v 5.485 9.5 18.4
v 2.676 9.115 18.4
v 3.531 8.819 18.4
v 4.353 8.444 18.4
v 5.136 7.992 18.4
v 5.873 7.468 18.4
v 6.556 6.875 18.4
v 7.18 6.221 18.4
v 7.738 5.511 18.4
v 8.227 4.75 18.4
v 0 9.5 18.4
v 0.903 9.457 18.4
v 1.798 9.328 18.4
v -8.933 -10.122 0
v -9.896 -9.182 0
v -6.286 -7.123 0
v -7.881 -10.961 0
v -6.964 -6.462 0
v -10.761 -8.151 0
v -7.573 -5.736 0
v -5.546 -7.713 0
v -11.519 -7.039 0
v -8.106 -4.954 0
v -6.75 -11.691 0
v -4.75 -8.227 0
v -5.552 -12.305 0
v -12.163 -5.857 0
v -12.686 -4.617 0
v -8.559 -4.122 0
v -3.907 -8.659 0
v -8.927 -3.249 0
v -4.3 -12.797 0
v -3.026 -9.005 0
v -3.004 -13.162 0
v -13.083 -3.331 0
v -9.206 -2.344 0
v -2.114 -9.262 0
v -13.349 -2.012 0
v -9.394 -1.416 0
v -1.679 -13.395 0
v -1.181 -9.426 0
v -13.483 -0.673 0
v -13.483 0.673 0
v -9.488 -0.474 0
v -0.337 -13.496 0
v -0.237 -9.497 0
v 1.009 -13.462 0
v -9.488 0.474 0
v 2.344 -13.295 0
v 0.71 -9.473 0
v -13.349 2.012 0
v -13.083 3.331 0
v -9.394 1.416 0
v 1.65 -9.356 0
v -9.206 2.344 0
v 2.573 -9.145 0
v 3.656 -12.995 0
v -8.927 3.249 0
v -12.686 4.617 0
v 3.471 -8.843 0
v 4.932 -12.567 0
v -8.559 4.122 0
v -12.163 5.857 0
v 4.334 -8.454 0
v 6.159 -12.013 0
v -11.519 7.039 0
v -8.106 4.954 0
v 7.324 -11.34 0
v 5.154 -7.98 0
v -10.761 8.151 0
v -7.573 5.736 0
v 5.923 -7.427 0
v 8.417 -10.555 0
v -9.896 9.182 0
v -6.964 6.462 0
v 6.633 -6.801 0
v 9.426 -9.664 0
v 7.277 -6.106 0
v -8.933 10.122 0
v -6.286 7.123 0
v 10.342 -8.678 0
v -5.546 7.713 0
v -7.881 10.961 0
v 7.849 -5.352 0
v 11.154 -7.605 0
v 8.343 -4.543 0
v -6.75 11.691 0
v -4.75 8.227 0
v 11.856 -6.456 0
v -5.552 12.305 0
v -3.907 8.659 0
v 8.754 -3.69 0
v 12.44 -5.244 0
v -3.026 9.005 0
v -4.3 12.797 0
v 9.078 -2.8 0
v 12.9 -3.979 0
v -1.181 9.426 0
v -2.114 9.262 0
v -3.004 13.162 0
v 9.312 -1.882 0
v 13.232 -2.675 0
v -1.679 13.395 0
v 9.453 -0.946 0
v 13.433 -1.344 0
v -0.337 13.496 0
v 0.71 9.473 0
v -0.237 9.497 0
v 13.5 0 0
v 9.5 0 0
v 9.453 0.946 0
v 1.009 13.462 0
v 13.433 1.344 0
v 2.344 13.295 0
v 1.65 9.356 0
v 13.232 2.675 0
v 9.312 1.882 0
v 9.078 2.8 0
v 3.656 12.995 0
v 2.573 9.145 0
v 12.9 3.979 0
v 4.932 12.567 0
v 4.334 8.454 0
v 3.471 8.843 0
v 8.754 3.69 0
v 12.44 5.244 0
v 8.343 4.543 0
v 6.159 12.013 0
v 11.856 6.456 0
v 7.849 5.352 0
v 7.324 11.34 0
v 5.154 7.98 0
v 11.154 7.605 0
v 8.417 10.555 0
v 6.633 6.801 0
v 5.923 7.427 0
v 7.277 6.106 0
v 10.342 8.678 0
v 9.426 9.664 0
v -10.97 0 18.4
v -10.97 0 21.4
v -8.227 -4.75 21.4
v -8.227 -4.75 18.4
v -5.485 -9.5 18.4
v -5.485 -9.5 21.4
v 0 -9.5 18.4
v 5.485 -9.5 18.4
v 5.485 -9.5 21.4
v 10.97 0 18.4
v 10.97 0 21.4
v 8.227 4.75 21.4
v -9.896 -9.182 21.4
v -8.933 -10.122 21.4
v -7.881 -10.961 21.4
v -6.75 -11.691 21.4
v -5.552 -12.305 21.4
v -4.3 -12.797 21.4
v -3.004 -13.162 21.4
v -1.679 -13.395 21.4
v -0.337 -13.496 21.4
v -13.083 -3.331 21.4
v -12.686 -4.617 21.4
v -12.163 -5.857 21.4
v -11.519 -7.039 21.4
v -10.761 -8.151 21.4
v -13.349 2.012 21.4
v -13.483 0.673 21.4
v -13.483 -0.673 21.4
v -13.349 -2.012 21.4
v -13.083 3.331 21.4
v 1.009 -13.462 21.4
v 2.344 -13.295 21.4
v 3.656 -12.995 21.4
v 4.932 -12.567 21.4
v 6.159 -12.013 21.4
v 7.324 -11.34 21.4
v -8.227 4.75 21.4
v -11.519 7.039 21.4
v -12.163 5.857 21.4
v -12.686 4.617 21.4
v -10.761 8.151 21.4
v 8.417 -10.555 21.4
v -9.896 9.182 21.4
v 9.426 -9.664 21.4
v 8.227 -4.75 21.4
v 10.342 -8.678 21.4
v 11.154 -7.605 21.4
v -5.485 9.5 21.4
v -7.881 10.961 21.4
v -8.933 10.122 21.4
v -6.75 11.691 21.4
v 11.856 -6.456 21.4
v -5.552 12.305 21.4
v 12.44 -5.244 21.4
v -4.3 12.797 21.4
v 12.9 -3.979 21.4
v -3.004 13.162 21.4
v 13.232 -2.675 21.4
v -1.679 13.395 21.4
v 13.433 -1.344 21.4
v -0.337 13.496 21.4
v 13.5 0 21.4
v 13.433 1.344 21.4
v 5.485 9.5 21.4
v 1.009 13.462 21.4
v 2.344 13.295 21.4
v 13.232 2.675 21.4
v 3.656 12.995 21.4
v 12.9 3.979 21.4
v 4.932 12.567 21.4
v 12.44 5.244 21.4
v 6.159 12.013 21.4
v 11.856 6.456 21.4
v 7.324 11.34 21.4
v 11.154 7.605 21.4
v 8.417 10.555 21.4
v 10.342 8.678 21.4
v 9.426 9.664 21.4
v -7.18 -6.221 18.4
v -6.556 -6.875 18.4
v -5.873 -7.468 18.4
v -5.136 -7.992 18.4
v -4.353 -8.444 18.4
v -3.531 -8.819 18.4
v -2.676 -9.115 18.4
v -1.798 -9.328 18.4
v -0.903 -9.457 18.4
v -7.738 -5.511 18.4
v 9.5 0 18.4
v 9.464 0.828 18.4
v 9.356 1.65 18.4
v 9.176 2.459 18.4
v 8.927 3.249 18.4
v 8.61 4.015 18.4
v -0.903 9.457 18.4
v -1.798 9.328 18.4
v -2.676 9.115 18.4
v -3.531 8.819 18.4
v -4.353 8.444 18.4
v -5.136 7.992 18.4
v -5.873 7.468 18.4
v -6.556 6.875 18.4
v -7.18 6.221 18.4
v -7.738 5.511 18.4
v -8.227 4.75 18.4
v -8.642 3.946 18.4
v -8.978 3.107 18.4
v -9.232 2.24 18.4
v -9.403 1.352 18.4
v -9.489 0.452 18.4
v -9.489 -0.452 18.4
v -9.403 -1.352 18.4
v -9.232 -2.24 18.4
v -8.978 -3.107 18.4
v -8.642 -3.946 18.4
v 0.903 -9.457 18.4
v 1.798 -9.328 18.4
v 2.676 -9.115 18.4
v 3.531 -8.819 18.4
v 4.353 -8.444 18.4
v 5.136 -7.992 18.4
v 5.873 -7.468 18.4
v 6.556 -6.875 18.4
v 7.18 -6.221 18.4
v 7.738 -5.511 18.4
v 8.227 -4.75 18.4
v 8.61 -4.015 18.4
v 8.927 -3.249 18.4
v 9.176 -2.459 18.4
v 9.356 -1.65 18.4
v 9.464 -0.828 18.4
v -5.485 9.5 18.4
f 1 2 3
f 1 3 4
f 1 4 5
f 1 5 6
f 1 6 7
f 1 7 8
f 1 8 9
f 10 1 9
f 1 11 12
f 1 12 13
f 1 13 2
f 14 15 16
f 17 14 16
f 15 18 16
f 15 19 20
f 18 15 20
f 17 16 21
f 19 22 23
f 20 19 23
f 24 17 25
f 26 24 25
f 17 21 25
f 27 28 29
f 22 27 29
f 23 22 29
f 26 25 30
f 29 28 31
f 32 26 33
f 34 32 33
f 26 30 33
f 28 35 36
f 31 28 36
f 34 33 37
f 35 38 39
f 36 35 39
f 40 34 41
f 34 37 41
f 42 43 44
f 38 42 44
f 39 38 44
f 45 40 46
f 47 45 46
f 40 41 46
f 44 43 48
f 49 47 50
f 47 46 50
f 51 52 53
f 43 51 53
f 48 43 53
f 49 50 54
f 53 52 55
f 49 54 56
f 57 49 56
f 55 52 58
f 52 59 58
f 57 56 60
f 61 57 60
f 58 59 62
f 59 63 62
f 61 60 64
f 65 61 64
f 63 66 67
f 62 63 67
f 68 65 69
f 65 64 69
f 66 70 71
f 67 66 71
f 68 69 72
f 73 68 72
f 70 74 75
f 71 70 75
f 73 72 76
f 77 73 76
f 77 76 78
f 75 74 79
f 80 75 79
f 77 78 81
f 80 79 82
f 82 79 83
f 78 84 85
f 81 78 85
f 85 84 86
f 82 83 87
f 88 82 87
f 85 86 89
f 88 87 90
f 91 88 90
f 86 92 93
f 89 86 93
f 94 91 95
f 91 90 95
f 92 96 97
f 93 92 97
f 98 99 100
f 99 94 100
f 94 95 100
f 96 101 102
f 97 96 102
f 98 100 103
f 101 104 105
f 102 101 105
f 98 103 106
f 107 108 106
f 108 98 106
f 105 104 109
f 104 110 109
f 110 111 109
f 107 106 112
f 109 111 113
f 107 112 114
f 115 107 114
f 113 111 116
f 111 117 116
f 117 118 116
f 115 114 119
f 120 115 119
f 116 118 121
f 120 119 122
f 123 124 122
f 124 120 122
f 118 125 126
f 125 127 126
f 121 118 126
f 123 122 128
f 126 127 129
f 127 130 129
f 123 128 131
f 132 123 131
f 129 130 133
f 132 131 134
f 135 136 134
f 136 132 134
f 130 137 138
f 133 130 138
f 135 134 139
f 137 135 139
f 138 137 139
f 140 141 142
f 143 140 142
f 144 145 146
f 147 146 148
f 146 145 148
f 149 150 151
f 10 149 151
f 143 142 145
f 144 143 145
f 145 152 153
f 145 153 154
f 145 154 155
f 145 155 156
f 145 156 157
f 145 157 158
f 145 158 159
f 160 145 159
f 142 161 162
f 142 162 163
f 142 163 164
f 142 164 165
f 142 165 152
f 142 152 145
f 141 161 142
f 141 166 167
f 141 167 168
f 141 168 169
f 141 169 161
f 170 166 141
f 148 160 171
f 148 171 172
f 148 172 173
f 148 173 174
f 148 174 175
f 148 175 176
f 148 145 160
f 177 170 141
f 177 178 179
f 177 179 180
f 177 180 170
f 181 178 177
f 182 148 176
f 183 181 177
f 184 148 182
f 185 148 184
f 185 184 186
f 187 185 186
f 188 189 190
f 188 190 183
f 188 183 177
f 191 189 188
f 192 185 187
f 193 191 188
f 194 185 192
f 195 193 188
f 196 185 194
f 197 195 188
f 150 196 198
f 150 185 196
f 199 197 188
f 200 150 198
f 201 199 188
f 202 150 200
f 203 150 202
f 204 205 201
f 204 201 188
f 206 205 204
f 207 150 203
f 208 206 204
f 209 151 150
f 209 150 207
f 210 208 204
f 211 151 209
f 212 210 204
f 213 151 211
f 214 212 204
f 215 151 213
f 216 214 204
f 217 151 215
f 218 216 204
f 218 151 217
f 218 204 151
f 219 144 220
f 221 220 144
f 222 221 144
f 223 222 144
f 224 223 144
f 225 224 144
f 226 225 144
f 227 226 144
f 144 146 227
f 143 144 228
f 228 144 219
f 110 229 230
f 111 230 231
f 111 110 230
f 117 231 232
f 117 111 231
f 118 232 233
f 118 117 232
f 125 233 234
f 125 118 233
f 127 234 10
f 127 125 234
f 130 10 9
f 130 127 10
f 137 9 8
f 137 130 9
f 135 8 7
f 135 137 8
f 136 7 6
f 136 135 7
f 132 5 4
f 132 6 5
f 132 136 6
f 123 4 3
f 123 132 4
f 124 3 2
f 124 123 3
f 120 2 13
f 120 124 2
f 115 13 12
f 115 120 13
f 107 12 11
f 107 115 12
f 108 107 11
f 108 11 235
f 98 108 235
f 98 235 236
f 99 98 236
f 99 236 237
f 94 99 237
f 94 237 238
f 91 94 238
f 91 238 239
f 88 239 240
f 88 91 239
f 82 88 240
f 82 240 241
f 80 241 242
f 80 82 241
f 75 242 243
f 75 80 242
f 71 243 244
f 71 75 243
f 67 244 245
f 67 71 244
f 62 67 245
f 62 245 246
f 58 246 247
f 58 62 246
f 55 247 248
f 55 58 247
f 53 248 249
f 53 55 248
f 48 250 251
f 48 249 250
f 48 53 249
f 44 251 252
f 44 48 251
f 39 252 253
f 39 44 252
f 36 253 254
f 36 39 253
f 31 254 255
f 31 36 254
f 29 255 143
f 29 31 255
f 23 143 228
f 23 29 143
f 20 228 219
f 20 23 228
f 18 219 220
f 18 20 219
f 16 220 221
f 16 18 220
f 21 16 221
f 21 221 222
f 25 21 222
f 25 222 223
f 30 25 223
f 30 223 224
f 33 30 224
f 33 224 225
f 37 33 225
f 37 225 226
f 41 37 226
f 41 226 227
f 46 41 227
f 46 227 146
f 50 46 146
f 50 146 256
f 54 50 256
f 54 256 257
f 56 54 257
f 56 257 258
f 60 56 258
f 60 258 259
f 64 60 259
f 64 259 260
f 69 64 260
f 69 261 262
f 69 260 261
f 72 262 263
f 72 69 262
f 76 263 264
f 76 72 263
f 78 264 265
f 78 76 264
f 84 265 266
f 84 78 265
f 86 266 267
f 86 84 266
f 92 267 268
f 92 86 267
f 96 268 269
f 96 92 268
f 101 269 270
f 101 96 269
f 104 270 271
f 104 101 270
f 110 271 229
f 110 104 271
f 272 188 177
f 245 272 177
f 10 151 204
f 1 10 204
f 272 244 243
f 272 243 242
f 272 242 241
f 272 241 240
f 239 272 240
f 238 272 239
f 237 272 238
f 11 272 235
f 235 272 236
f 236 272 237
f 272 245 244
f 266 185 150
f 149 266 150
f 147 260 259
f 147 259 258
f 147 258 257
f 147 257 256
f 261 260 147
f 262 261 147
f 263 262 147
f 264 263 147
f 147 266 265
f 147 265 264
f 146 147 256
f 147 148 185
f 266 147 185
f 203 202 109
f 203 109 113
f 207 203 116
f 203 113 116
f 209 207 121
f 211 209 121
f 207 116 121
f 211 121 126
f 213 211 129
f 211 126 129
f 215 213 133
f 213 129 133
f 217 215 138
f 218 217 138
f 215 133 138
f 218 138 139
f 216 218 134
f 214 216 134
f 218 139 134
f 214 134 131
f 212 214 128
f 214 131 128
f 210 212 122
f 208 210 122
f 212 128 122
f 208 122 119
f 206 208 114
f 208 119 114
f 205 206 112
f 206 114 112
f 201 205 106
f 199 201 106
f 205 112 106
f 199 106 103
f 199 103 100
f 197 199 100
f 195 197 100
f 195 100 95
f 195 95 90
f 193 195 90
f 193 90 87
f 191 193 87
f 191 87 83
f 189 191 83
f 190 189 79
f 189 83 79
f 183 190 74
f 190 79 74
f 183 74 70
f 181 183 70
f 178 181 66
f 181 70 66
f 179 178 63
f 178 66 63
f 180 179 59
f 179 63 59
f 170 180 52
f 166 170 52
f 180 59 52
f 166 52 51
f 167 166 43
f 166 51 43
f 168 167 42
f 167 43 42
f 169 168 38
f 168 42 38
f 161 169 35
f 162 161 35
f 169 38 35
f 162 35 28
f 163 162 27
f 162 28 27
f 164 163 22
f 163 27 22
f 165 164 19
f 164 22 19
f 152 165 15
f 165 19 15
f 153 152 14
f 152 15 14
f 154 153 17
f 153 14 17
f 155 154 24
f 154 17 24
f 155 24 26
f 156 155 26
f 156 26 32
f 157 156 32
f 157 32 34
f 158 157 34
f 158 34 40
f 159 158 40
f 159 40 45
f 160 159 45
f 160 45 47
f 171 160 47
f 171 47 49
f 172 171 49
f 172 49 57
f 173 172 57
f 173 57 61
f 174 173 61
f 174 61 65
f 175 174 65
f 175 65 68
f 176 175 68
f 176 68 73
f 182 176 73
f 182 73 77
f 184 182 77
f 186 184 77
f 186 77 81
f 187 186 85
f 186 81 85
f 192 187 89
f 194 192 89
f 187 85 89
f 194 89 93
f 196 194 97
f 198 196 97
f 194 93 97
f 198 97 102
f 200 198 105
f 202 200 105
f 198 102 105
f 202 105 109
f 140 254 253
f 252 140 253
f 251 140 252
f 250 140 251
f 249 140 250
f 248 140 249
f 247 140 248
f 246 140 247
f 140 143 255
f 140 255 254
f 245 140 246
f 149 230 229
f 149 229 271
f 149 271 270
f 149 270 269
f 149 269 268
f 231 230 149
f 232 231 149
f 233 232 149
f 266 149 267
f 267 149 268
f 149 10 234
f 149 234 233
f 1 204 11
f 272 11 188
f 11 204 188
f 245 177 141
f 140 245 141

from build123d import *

# Parameters (mm, degrees)
F0_R     = 13.5
F0_R_2   = 9.5
F1_DEPTH = 21.4
F3_DEPTH = 3


with BuildPart() as f1:
    # F0 (on Top) → F1 (new body)
    with BuildSketch(Plane.XY):
        Circle(F0_R)
        Circle(F0_R_2, mode=Mode.SUBTRACT)
    extrude(amount=F1_DEPTH)

    # F2 (on face) → F3 (cut)
    with BuildSketch(Plane.XY.offset(21.4)):
        with BuildLine():
            Line((8.227241, -4.75), (10.969655, 0))
            Line((10.969655, 0), (8.227241, 4.75))
            ThreePointArc((8.227241, 4.75), (9.176295, 2.458781), (9.5, 0))
            ThreePointArc((9.5, 0), (9.176295, -2.458781), (8.227241, -4.75))
        make_face()
        with BuildLine():
            Line((-10.969655, 0), (-8.227241, -4.75))
            ThreePointArc((-8.227241, -4.75), (-9.5, 0), (-8.227241, 4.75))
            Line((-8.227241, 4.75), (-10.969655, 0))
        make_face()
        with BuildLine():
            Line((-5.484828, -9.5), (0, -9.5))
            ThreePointArc((0, -9.5), (-4.75, -8.227241), (-8.227241, -4.75))
            Line((-8.227241, -4.75), (-5.484828, -9.5))
        make_face()
        with BuildLine():
            ThreePointArc((0, 9.5), (4.75, 8.227241), (8.227241, 4.75))
            Line((8.227241, 4.75), (5.484828, 9.5))
            Line((5.484828, 9.5), (0, 9.5))
        make_face()
        with BuildLine():
            Line((5.484828, -9.5), (8.227241, -4.75))
            ThreePointArc((8.227241, -4.75), (4.75, -8.227241), (0, -9.5))
            Line((0, -9.5), (5.484828, -9.5))
        make_face()
        with BuildLine():
            ThreePointArc((-8.227241, 4.75), (-4.75, 8.227241), (0, 9.5))
            Line((0, 9.5), (-5.484828, 9.5))
            Line((-5.484828, 9.5), (-8.227241, 4.75))
        make_face()
    extrude(amount=-F3_DEPTH, mode=Mode.SUBTRACT)


solid = f1.part
